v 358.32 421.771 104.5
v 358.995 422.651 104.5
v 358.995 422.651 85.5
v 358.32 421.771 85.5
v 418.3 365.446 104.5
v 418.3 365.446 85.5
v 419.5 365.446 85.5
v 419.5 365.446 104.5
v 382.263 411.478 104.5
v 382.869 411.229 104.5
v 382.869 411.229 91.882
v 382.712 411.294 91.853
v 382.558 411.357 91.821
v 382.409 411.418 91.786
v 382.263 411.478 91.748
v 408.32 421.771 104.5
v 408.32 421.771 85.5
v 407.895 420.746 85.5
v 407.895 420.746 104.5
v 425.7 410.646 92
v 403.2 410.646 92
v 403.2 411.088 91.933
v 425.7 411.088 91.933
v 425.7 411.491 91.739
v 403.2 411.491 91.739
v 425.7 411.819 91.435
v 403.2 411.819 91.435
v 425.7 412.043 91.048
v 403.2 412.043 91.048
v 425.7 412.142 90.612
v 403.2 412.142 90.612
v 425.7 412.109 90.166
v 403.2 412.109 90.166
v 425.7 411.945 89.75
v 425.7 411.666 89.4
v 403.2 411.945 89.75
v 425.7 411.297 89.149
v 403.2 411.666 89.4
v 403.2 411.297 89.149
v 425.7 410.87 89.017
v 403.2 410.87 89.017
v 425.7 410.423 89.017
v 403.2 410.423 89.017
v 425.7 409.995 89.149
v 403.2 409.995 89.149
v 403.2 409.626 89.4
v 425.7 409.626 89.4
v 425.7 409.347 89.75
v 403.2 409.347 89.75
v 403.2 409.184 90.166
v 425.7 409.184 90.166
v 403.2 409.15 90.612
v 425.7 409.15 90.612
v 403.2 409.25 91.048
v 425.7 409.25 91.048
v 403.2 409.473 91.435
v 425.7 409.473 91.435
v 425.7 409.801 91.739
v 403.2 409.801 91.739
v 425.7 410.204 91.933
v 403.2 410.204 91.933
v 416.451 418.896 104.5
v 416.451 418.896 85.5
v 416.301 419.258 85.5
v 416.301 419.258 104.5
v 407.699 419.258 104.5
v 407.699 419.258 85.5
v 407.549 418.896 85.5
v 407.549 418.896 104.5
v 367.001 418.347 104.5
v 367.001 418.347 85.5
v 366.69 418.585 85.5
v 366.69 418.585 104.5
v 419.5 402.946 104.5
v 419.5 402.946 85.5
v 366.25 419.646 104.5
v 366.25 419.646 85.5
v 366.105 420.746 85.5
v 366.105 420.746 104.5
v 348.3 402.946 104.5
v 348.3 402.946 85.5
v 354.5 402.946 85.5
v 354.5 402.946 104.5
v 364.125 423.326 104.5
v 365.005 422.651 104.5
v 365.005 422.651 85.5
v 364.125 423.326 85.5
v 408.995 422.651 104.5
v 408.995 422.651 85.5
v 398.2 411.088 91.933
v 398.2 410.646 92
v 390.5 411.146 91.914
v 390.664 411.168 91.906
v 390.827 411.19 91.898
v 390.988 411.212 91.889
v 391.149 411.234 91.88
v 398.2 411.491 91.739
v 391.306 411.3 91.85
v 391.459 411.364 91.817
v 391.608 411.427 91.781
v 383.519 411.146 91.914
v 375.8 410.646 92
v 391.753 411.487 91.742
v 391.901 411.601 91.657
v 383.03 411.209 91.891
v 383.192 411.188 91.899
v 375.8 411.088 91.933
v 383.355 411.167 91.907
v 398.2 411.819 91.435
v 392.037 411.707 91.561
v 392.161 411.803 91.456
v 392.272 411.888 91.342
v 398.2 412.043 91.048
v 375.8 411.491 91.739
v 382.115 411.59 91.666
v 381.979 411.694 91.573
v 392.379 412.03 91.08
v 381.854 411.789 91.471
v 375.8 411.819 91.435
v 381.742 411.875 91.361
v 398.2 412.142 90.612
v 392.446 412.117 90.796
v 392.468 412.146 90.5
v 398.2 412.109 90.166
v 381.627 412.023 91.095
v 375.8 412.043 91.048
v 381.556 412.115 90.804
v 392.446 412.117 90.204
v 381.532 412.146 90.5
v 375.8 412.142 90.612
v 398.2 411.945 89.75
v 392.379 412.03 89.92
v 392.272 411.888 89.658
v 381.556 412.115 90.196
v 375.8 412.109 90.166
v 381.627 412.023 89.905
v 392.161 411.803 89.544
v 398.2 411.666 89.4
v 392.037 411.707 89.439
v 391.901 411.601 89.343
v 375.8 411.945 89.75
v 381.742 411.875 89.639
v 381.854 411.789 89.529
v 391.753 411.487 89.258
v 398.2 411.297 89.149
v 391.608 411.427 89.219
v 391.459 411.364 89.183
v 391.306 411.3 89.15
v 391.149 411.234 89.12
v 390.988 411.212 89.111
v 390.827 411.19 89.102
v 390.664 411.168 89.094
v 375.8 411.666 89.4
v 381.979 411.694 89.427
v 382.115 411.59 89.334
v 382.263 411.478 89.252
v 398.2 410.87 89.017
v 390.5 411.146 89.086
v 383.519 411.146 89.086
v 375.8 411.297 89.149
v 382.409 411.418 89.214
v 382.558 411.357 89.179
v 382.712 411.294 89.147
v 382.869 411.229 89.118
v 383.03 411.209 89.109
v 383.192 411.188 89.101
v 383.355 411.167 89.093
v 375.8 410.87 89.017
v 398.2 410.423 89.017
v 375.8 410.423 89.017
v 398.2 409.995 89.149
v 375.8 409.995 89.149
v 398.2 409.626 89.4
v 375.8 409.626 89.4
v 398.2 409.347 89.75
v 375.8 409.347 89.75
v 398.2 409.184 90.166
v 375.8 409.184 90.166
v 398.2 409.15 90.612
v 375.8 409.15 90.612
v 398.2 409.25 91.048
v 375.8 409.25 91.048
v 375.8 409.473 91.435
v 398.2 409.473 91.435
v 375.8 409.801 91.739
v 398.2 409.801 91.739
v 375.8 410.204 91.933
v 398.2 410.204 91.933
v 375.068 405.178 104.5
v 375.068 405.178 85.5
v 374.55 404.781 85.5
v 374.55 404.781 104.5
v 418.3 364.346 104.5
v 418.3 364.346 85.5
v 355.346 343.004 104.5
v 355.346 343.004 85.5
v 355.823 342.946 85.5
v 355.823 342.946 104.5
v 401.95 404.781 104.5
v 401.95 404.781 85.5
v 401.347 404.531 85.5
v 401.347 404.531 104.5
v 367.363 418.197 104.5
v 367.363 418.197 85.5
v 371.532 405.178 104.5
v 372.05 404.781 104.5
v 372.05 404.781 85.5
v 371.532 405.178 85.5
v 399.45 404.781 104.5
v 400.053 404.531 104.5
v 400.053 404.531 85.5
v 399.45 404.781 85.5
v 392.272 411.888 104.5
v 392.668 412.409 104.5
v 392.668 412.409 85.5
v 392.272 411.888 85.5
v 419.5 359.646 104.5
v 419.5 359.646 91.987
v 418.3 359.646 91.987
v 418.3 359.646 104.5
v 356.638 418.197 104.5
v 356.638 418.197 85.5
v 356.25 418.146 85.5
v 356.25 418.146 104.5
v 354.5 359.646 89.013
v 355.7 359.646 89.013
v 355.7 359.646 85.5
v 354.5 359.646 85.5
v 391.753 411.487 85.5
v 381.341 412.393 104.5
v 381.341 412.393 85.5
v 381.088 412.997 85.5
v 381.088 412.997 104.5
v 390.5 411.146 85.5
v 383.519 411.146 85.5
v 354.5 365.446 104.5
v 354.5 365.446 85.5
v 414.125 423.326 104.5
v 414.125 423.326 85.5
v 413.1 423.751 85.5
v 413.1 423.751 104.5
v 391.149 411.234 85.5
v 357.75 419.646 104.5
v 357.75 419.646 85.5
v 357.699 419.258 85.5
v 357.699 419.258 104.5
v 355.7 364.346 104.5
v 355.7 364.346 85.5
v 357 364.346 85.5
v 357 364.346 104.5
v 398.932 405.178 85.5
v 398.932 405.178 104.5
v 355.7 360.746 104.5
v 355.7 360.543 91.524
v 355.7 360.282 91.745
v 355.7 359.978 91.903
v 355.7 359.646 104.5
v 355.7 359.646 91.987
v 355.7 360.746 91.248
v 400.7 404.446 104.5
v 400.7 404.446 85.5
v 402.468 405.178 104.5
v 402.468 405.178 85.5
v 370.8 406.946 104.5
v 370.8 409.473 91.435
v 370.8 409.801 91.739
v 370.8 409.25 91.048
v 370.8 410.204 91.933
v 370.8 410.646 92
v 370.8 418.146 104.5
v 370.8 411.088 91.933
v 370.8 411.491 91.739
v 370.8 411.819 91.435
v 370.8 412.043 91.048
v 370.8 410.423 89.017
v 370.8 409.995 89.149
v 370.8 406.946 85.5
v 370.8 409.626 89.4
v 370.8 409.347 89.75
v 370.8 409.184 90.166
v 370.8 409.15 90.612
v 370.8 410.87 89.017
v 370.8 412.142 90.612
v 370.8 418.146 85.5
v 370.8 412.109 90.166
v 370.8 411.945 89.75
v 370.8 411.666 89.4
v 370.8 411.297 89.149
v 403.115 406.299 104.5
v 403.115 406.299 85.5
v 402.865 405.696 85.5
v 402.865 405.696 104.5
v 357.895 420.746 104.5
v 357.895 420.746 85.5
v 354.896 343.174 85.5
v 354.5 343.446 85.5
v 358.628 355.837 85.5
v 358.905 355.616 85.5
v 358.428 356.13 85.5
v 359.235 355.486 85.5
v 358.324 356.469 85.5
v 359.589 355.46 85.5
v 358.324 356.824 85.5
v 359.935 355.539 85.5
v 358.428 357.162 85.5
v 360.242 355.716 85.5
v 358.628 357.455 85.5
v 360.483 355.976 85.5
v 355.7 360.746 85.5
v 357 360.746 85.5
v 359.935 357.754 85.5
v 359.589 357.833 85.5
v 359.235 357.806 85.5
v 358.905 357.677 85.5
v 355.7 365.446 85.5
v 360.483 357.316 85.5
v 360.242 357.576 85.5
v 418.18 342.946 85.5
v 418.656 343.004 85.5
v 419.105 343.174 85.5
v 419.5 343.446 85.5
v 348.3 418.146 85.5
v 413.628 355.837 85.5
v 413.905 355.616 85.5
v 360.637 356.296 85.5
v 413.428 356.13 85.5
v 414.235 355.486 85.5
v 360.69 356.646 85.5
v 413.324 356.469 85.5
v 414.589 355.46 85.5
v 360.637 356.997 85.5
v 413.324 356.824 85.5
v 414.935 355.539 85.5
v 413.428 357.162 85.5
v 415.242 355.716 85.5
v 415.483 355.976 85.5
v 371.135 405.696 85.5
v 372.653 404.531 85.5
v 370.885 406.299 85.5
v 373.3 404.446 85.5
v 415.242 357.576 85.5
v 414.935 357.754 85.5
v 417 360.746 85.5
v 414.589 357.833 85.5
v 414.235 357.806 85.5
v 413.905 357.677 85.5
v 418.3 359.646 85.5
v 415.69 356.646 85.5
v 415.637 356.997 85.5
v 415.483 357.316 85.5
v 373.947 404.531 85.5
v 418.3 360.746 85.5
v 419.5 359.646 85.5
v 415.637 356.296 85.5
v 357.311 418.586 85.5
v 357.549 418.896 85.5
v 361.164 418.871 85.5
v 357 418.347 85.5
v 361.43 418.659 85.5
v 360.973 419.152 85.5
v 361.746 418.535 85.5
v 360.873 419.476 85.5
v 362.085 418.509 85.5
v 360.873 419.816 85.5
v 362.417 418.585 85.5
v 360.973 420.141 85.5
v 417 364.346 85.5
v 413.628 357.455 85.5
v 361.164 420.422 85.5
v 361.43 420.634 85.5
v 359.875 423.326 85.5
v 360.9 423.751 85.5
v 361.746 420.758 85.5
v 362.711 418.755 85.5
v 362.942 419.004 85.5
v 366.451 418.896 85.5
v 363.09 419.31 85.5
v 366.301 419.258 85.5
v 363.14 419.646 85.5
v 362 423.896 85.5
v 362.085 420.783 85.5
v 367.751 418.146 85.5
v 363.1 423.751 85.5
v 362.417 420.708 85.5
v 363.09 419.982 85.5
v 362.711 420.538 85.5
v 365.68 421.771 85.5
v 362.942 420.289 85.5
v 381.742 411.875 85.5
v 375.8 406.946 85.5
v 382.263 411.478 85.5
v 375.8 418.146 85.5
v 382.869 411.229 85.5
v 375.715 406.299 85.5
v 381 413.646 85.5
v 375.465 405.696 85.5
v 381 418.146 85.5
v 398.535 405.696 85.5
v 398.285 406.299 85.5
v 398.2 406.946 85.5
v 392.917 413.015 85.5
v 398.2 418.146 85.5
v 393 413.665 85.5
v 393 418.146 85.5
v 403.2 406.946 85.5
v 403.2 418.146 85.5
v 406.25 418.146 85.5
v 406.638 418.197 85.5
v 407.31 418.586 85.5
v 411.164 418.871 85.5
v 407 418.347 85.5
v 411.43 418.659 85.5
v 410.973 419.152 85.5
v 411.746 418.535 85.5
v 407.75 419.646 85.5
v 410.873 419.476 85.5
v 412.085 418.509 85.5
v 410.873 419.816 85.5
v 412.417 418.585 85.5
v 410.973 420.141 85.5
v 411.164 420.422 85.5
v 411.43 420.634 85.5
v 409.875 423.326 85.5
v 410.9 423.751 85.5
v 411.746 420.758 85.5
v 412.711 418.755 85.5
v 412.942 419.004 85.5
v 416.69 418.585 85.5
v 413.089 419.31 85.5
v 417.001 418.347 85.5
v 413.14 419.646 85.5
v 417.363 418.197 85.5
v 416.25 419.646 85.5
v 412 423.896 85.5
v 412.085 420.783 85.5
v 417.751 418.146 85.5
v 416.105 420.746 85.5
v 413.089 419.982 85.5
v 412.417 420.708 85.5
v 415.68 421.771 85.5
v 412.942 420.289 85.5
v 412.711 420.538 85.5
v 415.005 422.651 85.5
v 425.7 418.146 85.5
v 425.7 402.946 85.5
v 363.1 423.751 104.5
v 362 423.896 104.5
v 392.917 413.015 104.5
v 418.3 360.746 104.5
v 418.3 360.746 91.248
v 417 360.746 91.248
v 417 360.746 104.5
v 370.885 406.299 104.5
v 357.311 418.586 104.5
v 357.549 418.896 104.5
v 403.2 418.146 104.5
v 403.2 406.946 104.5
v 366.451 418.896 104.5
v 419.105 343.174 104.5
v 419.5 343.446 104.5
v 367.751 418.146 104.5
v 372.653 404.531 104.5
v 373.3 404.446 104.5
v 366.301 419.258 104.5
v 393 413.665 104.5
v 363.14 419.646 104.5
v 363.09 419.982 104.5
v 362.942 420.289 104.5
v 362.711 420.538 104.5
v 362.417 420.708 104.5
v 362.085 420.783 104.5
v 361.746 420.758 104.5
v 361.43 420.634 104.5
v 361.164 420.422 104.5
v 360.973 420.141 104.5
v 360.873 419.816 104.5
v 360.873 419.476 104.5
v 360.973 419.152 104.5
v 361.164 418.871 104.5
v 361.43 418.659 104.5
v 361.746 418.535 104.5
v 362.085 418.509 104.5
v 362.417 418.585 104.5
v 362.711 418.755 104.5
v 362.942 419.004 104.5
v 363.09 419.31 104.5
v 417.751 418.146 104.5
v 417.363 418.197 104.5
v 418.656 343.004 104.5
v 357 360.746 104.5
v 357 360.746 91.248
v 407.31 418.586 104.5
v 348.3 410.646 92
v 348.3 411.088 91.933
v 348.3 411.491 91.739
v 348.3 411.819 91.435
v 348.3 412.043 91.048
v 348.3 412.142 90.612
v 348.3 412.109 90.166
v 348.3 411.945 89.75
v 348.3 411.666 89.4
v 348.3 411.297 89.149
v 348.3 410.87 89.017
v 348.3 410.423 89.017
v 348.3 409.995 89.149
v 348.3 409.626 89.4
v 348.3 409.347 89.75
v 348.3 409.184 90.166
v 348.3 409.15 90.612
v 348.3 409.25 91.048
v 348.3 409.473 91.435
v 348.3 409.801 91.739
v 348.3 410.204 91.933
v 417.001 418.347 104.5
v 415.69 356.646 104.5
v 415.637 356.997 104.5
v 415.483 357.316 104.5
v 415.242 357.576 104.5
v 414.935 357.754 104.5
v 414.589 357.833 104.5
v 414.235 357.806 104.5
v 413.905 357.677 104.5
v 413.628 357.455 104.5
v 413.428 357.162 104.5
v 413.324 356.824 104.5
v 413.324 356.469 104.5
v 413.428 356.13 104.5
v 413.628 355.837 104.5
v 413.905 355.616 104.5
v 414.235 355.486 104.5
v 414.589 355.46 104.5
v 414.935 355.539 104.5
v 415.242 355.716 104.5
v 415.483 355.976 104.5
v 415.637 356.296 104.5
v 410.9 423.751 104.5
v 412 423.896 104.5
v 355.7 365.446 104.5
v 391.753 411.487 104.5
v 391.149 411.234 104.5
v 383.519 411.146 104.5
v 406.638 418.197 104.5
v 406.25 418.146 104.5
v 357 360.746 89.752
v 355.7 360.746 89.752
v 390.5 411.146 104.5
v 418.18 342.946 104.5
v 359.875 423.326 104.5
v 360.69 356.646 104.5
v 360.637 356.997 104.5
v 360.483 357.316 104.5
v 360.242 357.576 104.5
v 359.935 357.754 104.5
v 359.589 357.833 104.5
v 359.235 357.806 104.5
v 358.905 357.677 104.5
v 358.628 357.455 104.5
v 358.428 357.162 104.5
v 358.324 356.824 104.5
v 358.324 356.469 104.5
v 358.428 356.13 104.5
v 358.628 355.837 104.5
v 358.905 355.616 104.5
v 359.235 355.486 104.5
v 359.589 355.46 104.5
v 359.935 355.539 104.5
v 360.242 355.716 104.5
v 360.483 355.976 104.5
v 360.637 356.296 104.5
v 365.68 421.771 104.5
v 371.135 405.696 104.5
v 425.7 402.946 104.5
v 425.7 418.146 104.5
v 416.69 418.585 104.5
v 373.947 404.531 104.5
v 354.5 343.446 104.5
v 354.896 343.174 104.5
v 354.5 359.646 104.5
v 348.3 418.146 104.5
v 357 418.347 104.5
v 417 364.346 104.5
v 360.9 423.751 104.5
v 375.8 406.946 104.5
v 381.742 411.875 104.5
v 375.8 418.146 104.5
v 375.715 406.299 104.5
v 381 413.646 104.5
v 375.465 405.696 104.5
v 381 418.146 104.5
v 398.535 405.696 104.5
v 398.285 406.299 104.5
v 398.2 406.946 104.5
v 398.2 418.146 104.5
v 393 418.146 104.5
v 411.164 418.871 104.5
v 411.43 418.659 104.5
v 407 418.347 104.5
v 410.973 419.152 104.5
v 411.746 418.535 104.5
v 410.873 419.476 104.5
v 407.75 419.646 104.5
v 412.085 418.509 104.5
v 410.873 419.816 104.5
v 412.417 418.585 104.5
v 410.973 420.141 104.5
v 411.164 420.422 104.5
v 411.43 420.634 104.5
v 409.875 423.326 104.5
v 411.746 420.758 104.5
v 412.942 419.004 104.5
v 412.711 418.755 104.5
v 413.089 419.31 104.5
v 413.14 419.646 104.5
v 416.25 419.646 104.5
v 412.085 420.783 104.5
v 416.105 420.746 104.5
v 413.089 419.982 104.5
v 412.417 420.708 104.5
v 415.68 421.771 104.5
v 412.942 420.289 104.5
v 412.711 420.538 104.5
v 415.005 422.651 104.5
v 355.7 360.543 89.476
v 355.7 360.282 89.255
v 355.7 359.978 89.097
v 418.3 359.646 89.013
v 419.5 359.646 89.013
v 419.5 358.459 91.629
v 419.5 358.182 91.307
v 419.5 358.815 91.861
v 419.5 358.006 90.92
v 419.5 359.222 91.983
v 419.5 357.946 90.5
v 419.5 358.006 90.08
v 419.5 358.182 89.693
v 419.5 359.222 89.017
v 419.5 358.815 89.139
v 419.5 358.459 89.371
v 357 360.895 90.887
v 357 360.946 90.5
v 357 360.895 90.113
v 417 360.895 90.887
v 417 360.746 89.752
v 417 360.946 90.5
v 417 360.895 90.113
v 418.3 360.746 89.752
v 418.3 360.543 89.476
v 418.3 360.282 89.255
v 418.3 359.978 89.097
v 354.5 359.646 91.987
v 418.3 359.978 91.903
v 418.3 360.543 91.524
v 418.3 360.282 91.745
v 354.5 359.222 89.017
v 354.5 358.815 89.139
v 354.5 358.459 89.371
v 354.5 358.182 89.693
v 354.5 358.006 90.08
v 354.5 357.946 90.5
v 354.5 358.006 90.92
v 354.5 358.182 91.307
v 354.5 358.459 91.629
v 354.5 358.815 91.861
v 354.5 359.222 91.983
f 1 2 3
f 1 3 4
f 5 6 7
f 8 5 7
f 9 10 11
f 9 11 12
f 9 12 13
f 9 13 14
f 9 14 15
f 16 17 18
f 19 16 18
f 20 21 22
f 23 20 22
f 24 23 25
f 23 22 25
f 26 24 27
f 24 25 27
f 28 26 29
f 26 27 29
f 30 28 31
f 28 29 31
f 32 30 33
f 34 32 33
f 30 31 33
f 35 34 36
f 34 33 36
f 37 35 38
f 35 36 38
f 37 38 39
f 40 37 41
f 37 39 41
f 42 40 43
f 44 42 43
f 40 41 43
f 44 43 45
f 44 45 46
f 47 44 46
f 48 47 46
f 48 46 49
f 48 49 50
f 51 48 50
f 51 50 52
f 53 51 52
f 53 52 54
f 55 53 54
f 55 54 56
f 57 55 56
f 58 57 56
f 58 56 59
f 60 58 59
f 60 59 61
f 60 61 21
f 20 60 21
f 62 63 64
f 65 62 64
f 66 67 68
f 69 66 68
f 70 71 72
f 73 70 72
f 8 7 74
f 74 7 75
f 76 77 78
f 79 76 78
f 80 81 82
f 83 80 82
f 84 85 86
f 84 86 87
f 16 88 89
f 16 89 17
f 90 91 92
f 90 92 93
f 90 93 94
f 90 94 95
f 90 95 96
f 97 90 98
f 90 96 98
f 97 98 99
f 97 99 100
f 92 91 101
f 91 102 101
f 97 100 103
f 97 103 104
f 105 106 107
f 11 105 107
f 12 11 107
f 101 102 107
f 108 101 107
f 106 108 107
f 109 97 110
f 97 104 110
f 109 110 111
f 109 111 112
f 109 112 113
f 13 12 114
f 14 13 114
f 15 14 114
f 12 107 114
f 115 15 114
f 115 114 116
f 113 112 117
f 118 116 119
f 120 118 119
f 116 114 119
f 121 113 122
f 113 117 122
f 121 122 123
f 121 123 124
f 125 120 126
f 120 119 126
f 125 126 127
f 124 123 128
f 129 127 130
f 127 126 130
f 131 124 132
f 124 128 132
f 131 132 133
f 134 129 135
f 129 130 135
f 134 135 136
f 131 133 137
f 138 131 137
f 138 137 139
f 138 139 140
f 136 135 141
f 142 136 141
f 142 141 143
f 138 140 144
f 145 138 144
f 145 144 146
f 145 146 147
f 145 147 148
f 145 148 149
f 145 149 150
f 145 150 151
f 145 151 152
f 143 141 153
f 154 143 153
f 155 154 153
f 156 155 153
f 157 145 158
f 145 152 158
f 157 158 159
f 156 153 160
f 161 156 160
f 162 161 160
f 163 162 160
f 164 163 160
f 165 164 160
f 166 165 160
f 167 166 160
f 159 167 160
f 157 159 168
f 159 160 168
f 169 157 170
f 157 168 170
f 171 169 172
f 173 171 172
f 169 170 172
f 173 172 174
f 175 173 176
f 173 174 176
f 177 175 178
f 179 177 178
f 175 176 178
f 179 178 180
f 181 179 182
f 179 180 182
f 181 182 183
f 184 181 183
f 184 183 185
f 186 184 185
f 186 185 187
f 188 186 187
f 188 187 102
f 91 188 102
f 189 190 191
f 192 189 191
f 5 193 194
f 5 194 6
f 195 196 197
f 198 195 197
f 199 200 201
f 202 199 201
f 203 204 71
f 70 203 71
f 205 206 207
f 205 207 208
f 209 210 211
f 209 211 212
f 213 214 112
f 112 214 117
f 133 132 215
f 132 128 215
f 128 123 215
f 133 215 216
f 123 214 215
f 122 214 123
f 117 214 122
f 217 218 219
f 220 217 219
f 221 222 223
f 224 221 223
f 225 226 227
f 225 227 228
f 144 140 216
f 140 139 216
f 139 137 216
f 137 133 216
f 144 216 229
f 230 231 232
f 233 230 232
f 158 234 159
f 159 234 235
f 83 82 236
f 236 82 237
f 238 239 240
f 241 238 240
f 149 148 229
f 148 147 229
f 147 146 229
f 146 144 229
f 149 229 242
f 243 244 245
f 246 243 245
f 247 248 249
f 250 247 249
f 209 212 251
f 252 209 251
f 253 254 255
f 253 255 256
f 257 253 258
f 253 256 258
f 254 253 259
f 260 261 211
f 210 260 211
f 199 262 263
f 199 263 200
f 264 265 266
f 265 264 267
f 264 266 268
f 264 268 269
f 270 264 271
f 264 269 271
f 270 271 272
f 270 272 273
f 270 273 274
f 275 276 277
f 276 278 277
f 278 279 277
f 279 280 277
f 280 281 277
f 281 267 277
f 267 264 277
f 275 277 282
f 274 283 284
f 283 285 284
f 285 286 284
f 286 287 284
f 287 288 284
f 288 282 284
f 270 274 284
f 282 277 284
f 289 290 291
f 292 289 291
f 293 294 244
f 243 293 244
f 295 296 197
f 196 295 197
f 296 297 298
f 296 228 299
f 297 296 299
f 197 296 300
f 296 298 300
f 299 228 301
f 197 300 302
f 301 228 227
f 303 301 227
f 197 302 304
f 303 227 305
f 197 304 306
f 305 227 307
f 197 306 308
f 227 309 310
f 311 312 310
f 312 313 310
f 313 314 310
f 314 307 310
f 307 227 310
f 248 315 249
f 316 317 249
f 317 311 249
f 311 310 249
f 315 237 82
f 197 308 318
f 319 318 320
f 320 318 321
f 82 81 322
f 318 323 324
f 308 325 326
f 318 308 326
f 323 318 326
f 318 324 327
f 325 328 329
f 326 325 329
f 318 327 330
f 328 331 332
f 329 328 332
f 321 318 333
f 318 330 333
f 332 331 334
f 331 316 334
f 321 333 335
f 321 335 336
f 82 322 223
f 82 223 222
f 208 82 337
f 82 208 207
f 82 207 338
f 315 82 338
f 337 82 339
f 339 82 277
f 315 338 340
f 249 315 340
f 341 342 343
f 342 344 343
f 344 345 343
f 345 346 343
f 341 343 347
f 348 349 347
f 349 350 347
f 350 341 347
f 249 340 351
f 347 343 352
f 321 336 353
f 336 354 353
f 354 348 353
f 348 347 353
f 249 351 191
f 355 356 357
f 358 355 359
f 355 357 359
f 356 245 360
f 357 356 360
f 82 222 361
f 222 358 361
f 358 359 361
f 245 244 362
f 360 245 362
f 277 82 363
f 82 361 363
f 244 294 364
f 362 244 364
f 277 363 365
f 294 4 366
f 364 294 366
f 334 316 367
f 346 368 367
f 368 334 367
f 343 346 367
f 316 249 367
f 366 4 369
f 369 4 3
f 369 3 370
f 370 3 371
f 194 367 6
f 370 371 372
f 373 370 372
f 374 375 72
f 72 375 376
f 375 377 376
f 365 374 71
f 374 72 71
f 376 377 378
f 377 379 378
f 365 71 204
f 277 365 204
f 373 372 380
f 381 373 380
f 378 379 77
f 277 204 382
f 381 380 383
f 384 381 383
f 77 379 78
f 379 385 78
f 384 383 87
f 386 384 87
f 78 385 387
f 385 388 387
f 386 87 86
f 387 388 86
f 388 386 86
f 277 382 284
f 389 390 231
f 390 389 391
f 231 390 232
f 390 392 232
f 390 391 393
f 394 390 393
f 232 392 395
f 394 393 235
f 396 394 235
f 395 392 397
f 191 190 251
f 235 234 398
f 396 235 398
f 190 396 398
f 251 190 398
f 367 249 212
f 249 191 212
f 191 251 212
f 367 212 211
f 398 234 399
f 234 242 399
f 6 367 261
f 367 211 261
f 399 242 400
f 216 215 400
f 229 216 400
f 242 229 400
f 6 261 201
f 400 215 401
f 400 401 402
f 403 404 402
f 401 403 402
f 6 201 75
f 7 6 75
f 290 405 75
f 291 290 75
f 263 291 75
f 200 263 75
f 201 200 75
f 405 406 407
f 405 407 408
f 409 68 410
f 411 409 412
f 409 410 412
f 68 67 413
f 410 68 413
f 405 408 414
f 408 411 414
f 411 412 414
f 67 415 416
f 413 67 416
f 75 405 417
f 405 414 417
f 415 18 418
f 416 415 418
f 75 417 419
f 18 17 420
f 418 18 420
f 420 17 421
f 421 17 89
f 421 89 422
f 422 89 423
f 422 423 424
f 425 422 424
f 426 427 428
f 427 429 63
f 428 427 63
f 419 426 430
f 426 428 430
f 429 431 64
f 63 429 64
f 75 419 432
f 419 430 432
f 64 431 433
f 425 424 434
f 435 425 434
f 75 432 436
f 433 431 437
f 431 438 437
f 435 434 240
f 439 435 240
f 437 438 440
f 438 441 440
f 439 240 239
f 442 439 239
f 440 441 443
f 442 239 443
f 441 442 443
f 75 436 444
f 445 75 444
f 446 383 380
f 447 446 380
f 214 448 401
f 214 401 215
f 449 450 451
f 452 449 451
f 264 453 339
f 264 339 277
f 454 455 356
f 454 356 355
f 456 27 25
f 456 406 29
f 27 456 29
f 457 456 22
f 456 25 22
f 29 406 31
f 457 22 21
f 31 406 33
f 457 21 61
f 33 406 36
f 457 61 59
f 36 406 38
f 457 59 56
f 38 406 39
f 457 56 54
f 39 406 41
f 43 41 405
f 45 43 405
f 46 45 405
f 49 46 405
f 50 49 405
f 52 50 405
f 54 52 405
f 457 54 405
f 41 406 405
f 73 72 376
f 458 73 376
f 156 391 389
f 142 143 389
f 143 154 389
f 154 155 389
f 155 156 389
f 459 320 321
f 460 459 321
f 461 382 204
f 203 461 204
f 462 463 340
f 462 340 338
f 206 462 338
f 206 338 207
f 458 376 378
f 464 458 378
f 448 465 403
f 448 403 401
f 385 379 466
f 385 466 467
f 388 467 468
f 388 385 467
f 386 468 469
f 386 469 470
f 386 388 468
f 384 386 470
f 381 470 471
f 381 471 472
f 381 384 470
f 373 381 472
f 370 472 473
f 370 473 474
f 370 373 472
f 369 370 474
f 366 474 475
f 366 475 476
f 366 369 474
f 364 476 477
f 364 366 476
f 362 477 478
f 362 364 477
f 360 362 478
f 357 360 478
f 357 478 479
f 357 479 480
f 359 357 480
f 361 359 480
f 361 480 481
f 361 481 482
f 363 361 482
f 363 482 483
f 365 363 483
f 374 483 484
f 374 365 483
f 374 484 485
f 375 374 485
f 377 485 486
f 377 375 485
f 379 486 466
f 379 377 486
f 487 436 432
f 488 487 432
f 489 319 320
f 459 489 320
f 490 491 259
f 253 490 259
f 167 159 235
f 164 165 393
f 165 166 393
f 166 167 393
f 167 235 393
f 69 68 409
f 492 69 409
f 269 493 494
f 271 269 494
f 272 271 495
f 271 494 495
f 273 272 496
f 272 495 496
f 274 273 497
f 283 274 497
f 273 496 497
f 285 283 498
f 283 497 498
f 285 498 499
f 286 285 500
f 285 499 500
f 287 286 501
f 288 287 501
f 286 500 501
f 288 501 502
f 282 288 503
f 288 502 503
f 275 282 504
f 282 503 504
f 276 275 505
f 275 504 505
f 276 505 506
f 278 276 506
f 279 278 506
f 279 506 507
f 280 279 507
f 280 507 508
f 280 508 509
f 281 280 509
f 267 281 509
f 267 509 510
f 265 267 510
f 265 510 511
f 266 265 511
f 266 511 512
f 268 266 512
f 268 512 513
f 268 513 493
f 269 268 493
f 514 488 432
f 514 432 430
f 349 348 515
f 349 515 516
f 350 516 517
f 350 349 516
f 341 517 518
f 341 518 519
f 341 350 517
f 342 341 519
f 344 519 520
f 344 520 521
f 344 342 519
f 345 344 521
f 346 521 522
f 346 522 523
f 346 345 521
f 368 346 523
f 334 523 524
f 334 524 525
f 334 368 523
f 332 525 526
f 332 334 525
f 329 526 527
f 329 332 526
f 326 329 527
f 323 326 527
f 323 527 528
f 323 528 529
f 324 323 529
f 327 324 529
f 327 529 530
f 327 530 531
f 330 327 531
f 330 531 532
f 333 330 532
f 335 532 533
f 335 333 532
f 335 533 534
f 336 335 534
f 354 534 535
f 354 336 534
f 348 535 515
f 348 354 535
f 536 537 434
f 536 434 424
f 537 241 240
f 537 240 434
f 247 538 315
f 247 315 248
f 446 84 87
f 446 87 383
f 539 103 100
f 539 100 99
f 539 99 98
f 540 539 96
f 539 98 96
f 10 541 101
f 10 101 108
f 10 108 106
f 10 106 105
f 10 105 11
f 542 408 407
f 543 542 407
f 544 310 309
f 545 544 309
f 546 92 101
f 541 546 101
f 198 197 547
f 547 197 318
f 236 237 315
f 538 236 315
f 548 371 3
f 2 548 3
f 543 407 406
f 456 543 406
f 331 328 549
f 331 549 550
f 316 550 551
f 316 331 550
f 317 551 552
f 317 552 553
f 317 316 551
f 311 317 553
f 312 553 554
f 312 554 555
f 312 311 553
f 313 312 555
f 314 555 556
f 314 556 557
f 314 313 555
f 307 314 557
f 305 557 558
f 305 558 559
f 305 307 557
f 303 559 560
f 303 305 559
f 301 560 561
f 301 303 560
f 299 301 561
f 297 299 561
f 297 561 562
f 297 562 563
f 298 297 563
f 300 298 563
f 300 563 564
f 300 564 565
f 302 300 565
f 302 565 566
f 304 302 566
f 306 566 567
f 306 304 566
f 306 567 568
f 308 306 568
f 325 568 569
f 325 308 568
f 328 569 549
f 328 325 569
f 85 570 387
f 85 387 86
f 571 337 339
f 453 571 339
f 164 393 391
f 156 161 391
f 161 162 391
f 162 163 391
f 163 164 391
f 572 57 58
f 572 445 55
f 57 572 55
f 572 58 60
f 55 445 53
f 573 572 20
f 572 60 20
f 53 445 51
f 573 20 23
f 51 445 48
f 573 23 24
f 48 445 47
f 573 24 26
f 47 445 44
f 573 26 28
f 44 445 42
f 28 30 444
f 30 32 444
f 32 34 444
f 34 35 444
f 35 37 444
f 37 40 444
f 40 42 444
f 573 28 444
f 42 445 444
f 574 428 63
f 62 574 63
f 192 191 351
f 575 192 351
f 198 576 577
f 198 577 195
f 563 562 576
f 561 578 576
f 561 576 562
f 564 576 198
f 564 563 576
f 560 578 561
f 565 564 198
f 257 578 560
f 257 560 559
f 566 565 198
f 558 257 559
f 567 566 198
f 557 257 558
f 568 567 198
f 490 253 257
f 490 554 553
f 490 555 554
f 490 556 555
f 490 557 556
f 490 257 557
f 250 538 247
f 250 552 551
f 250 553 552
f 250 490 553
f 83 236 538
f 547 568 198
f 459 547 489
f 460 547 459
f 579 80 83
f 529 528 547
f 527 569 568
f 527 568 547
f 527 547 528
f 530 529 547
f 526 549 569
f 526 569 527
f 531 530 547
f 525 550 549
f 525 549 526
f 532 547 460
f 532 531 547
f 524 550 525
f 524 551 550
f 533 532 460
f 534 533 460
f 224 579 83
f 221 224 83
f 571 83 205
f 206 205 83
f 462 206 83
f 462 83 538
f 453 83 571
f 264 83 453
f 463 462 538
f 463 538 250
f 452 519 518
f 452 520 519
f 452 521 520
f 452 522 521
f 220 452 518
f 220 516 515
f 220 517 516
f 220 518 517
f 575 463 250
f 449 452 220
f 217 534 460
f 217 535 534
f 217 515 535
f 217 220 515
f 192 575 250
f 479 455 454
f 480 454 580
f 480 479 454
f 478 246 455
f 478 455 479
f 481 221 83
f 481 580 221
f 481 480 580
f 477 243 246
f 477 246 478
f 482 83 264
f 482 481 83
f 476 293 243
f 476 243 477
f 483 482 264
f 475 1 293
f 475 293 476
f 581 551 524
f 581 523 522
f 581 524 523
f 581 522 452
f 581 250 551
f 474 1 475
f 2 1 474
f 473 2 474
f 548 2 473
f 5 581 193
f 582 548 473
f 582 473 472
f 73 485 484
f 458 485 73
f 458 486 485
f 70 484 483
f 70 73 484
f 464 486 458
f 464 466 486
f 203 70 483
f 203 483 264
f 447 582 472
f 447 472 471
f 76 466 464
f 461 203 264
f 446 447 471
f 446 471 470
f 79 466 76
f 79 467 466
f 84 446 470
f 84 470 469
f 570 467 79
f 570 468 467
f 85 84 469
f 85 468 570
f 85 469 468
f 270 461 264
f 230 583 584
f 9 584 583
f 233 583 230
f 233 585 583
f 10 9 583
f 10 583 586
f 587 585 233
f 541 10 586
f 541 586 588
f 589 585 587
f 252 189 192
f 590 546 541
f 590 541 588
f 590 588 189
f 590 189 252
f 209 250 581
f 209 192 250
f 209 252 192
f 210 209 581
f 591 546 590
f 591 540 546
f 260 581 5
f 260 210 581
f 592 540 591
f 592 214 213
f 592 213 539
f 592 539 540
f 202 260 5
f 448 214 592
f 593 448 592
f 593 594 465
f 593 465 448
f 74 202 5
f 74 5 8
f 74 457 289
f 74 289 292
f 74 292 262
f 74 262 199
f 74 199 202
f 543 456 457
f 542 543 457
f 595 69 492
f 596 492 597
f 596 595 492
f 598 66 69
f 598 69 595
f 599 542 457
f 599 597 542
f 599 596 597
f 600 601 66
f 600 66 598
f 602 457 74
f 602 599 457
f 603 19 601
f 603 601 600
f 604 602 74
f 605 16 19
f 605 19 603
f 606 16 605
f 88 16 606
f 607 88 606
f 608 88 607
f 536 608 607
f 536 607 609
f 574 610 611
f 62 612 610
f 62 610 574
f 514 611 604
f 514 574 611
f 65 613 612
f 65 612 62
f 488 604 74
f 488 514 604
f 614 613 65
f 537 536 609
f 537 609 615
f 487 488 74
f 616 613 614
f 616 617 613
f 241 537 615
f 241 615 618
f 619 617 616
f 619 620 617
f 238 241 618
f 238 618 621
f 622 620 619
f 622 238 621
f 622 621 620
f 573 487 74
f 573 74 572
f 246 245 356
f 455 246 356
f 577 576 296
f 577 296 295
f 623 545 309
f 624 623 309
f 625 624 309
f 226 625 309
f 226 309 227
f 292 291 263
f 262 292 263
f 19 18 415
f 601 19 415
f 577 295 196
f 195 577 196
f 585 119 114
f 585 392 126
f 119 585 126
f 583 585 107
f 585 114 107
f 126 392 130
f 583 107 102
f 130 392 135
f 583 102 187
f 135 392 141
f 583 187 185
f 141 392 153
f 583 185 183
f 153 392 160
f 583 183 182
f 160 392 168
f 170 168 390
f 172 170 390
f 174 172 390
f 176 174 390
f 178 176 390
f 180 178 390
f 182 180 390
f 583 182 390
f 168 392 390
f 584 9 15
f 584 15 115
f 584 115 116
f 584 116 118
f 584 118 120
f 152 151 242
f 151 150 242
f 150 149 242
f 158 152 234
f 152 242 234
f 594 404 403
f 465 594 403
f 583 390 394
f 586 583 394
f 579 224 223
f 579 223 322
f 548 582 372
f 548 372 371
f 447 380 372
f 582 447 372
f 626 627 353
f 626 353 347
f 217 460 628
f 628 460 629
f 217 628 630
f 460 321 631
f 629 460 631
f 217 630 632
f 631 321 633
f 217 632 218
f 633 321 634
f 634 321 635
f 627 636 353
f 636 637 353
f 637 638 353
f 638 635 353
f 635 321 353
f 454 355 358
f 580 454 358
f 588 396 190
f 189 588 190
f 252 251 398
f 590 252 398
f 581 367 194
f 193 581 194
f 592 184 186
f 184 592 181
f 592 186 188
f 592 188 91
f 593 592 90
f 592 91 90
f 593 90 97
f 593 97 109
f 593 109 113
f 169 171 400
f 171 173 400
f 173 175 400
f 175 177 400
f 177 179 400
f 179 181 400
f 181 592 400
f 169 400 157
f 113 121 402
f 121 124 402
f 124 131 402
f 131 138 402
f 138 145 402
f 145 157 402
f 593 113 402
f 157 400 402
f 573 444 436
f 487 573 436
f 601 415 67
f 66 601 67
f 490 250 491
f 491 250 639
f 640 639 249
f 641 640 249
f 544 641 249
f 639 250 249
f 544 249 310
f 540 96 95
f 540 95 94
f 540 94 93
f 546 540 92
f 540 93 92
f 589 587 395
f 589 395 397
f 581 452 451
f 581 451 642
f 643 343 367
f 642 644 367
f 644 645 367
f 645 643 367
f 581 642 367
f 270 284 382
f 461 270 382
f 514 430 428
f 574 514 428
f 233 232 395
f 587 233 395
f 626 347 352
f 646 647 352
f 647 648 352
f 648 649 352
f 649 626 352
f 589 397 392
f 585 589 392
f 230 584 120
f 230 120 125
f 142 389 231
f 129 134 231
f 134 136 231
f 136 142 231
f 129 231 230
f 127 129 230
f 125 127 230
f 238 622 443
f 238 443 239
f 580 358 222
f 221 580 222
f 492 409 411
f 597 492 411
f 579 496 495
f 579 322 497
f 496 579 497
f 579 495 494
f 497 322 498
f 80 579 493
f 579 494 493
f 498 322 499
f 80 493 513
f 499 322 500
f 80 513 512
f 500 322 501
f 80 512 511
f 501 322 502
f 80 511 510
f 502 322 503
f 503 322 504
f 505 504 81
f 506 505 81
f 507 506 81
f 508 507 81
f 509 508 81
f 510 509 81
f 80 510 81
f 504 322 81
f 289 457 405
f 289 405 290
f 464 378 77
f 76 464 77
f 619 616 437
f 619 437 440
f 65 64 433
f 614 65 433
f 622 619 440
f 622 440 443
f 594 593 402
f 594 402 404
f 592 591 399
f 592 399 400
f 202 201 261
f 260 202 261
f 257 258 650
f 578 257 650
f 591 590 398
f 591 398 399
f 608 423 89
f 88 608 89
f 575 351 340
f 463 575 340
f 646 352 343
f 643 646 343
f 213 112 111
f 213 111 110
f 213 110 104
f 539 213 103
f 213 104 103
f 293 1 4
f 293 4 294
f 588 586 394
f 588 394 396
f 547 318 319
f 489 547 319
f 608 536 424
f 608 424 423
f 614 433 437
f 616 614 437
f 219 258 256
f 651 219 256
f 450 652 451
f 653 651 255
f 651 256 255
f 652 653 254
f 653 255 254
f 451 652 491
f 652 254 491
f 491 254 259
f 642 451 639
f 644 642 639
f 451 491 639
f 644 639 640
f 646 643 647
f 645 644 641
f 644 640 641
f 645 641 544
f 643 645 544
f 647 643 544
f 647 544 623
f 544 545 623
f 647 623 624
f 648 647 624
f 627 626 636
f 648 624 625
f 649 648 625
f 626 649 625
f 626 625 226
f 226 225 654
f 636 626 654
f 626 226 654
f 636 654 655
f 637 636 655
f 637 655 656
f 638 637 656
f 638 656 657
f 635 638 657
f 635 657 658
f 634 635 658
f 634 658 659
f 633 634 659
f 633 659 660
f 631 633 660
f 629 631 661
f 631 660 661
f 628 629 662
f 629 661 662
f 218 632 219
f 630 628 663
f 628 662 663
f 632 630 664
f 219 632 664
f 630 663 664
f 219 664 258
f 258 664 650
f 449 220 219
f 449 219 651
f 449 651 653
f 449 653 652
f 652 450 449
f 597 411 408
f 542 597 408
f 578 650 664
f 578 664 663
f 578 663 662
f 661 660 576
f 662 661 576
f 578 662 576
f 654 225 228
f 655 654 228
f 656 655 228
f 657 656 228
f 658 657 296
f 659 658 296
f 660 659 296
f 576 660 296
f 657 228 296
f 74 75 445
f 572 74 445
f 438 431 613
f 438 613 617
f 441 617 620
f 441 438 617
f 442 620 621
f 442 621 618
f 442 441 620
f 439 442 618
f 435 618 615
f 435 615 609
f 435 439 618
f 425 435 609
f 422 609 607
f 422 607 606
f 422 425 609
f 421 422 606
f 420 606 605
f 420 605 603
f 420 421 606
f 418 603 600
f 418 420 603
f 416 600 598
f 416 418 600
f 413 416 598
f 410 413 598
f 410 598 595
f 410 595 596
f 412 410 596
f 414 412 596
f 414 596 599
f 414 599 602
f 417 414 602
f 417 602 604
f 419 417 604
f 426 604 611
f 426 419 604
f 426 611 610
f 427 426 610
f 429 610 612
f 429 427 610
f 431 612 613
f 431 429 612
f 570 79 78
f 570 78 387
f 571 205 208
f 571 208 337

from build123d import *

# Parameters (mm, degrees)
CROQUIS3_R              = 11.401652729
CROQUIS3_R_2            = 11.401667337
CROQUIS3_R_3            = 11.897340247
CROQUIS3_R_4            = 11.897352739
SALIENTE_EXTRUIR3_DEPTH = 190
ESCALA1_SCALE           = 0.1
CORTAR_EXTRUIR1_REACH   = 445.395
CROQUIS4_R              = 1.5


with BuildPart() as part:
    # Croquis3 → Saliente-Extruir3 (new body)
    with BuildSketch(Plane.XY):
        Polygon((62.000007629, 600), (62.000007629, 225.000019073), (74.00001049, 225.000019073), (74.00001049, 214.000015259), (87.000007629, 214.000015259), (87.000007629, 178.000011444), (74.00001049, 178.000011444), (74.00001049, 167.000007629), (62.000007629, 167.000007629), (62.000007629, 5.000014305), (65.960402489, 2.275037766), (70.457281385, 0.575536435), (75.230016146, 1.277e-05), (698.796314631, 1.277e-05), (703.5598034, 0.579722678), (708.047413263, 2.279101392), (712.000045776, 5.000014305), (712.000045776, 167.000007629), (700, 167.000007629), (700, 178.000011444), (687.000045776, 178.000011444), (687.000045776, 214.000015259), (700, 214.000015259), (700, 225.000019073), (712.000045776, 225.000019073), (712.000045776, 600), (774.000005259, 600), (774.000005259, 752.00002538), (694.509434327, 752.00002538), (690.625557849, 752.509989697), (687.005212426, 754.008120277), (683.896969683, 756.390727503), (681.511844529, 759.497038521), (680.011611015, 763.116513016), (679.499106553, 767.000055121), (678.047678684, 777.998361779), (673.800452258, 788.246775122), (667.046530749, 797.047511795), (658.245794076, 803.801433304), (647.997385964, 808.04865973), (636.999123424, 809.500087598), (626.000816766, 808.04865973), (615.752403424, 803.801433304), (606.95162999, 797.047511795), (600.197708482, 788.246775122), (595.950463171, 777.998361779), (594.499035302, 767.000055121), (593.986767843, 763.118308924), (592.487747317, 759.501223225), (590.103931003, 756.3950759), (586.997742405, 754.011313366), (583.380656707, 752.512292839), (579.49891051, 752.00002538), (548.999055228, 752.00002538), (548.999055228, 639.999074709), (548.147197279, 633.528619953), (545.649669298, 627.49905312), (541.676700243, 622.321402668), (536.499049791, 618.348433613), (530.469542427, 615.850917196), (523.99905113, 614.999054437), (517.528559834, 615.850917196), (511.499052469, 618.348433613), (506.321327187, 622.321402668), (502.348358132, 627.49905312), (499.850909117, 633.528619953), (498.999051168, 639.999074709), (498.999051168, 752.00002538), (446.998930409, 752.00002538), (446.998930409, 707.189762429), (446.168386872, 700.691496039), (443.684287831, 694.629639501), (439.715890971, 689.4172413), (434.533657196, 685.409524601), (428.490716264, 682.879616244), (421.998901713, 682.000023228), (352.188721049, 682.000023228), (345.690420663, 682.830483045), (339.628518676, 685.314615834), (334.416116333, 689.283045399), (330.408433532, 694.465235341), (327.878564453, 700.508173573), (326.998895263, 707.00002538), (326.998895263, 752.00002538), (274.999042406, 752.00002538), (274.999042406, 639.999074709), (274.147184457, 633.528619953), (271.649656477, 627.49905312), (267.676700082, 622.321402668), (262.499033131, 618.348433613), (256.469494216, 615.850917196), (249.999032319, 614.999054437), (243.528541023, 615.850917196), (237.499033658, 618.348433613), (232.321366707, 622.321402668), (228.348397652, 627.49905312), (225.850869671, 633.528619953), (224.999011722, 639.999074709), (224.999011722, 752.00002538), (194.509863476, 752.00002538), (190.625986998, 752.509989697), (187.007479722, 754.008120277), (183.899236979, 756.390727503), (181.514111826, 759.497038521), (180.012558361, 763.116513016), (179.500053899, 767.000055121), (178.04862603, 777.998361779), (173.801399604, 788.246775122), (167.047478096, 797.047511795), (158.246713776, 803.801433304), (147.998300434, 808.04865973), (136.999993776, 809.500087598), (126.001687117, 808.04865973), (115.753273775, 803.801433304), (106.952500342, 797.047511795), (100.198578833, 788.246775122), (95.951352407, 777.998361779), (94.499924539, 767.000055121), (93.987657079, 763.118308924), (92.488636553, 759.501223225), (90.104895736, 756.3950759), (86.998707138, 754.011313366), (83.381621439, 752.512292839), (79.499875242, 752.00002538), (0, 752.00002538), (0, 600), align=None)
        with Locations((136.999993776, 767.000055121)):
            Circle(CROQUIS3_R, mode=Mode.SUBTRACT)
        with Locations((636.999123424, 767.000055121)):
            Circle(CROQUIS3_R_2, mode=Mode.SUBTRACT)
        with Locations((112.000007629, 137.000017166)):
            Circle(CROQUIS3_R_3, mode=Mode.SUBTRACT)
        with Locations((662.000007629, 137.000017166)):
            Circle(CROQUIS3_R_4, mode=Mode.SUBTRACT)
    extrude(amount=SALIENTE_EXTRUIR3_DEPTH)


with BuildPart() as part_1:
    # Escala1: scaled about (387.000056508, 381.051372624, 95)
    add(part.part.scale(ESCALA1_SCALE).moved(Location((348.300050857, 342.946235362, 85.5))))

    # Cortar-Extruir1: up to this face of the body (flat: up to its plane)
    cortar_extruir1_end = Plane(part_1.part.faces().sort_by_distance((425.700051383, 410.546236631, 95))[0])
    # Croquis4 → Cortar-Extruir1 (cut, up to the picked face)
    with BuildSketch(Plane.ZY.offset(-348.300050857), mode=Mode.PRIVATE) as cortar_extruir1_sk1:
        with Locations((90.5, 410.646237899)):
            Circle(CROQUIS4_R)
    cortar_extruir1_tool1 = split(extrude(cortar_extruir1_sk1.sketch, amount=-CORTAR_EXTRUIR1_REACH, mode=Mode.PRIVATE), bisect_by=cortar_extruir1_end, keep=Keep.BOTH, mode=Mode.PRIVATE)
    # Croquis4 → Cortar-Extruir1 (cut, up to the picked face)
    with BuildSketch(Plane.ZY.offset(-348.300050857), mode=Mode.PRIVATE) as cortar_extruir1_sk2:
        with Locations(Location((90.5, 359.446236792, 0), (0, 0, 7.662229932))):
            Circle(CROQUIS4_R)
    cortar_extruir1_tool2 = split(extrude(cortar_extruir1_sk2.sketch, amount=-CORTAR_EXTRUIR1_REACH, mode=Mode.PRIVATE), bisect_by=cortar_extruir1_end, keep=Keep.BOTH, mode=Mode.PRIVATE)
    add(cortar_extruir1_tool1.solids().sort_by(Axis((348.300051, 410.646238, 90.5), (1, 0, 0)))[0], mode=Mode.SUBTRACT)
    add(cortar_extruir1_tool2.solids().sort_by(Axis((348.300051, 359.446237, 90.5), (1, 0, 0)))[0], mode=Mode.SUBTRACT)


solid = part_1.part
